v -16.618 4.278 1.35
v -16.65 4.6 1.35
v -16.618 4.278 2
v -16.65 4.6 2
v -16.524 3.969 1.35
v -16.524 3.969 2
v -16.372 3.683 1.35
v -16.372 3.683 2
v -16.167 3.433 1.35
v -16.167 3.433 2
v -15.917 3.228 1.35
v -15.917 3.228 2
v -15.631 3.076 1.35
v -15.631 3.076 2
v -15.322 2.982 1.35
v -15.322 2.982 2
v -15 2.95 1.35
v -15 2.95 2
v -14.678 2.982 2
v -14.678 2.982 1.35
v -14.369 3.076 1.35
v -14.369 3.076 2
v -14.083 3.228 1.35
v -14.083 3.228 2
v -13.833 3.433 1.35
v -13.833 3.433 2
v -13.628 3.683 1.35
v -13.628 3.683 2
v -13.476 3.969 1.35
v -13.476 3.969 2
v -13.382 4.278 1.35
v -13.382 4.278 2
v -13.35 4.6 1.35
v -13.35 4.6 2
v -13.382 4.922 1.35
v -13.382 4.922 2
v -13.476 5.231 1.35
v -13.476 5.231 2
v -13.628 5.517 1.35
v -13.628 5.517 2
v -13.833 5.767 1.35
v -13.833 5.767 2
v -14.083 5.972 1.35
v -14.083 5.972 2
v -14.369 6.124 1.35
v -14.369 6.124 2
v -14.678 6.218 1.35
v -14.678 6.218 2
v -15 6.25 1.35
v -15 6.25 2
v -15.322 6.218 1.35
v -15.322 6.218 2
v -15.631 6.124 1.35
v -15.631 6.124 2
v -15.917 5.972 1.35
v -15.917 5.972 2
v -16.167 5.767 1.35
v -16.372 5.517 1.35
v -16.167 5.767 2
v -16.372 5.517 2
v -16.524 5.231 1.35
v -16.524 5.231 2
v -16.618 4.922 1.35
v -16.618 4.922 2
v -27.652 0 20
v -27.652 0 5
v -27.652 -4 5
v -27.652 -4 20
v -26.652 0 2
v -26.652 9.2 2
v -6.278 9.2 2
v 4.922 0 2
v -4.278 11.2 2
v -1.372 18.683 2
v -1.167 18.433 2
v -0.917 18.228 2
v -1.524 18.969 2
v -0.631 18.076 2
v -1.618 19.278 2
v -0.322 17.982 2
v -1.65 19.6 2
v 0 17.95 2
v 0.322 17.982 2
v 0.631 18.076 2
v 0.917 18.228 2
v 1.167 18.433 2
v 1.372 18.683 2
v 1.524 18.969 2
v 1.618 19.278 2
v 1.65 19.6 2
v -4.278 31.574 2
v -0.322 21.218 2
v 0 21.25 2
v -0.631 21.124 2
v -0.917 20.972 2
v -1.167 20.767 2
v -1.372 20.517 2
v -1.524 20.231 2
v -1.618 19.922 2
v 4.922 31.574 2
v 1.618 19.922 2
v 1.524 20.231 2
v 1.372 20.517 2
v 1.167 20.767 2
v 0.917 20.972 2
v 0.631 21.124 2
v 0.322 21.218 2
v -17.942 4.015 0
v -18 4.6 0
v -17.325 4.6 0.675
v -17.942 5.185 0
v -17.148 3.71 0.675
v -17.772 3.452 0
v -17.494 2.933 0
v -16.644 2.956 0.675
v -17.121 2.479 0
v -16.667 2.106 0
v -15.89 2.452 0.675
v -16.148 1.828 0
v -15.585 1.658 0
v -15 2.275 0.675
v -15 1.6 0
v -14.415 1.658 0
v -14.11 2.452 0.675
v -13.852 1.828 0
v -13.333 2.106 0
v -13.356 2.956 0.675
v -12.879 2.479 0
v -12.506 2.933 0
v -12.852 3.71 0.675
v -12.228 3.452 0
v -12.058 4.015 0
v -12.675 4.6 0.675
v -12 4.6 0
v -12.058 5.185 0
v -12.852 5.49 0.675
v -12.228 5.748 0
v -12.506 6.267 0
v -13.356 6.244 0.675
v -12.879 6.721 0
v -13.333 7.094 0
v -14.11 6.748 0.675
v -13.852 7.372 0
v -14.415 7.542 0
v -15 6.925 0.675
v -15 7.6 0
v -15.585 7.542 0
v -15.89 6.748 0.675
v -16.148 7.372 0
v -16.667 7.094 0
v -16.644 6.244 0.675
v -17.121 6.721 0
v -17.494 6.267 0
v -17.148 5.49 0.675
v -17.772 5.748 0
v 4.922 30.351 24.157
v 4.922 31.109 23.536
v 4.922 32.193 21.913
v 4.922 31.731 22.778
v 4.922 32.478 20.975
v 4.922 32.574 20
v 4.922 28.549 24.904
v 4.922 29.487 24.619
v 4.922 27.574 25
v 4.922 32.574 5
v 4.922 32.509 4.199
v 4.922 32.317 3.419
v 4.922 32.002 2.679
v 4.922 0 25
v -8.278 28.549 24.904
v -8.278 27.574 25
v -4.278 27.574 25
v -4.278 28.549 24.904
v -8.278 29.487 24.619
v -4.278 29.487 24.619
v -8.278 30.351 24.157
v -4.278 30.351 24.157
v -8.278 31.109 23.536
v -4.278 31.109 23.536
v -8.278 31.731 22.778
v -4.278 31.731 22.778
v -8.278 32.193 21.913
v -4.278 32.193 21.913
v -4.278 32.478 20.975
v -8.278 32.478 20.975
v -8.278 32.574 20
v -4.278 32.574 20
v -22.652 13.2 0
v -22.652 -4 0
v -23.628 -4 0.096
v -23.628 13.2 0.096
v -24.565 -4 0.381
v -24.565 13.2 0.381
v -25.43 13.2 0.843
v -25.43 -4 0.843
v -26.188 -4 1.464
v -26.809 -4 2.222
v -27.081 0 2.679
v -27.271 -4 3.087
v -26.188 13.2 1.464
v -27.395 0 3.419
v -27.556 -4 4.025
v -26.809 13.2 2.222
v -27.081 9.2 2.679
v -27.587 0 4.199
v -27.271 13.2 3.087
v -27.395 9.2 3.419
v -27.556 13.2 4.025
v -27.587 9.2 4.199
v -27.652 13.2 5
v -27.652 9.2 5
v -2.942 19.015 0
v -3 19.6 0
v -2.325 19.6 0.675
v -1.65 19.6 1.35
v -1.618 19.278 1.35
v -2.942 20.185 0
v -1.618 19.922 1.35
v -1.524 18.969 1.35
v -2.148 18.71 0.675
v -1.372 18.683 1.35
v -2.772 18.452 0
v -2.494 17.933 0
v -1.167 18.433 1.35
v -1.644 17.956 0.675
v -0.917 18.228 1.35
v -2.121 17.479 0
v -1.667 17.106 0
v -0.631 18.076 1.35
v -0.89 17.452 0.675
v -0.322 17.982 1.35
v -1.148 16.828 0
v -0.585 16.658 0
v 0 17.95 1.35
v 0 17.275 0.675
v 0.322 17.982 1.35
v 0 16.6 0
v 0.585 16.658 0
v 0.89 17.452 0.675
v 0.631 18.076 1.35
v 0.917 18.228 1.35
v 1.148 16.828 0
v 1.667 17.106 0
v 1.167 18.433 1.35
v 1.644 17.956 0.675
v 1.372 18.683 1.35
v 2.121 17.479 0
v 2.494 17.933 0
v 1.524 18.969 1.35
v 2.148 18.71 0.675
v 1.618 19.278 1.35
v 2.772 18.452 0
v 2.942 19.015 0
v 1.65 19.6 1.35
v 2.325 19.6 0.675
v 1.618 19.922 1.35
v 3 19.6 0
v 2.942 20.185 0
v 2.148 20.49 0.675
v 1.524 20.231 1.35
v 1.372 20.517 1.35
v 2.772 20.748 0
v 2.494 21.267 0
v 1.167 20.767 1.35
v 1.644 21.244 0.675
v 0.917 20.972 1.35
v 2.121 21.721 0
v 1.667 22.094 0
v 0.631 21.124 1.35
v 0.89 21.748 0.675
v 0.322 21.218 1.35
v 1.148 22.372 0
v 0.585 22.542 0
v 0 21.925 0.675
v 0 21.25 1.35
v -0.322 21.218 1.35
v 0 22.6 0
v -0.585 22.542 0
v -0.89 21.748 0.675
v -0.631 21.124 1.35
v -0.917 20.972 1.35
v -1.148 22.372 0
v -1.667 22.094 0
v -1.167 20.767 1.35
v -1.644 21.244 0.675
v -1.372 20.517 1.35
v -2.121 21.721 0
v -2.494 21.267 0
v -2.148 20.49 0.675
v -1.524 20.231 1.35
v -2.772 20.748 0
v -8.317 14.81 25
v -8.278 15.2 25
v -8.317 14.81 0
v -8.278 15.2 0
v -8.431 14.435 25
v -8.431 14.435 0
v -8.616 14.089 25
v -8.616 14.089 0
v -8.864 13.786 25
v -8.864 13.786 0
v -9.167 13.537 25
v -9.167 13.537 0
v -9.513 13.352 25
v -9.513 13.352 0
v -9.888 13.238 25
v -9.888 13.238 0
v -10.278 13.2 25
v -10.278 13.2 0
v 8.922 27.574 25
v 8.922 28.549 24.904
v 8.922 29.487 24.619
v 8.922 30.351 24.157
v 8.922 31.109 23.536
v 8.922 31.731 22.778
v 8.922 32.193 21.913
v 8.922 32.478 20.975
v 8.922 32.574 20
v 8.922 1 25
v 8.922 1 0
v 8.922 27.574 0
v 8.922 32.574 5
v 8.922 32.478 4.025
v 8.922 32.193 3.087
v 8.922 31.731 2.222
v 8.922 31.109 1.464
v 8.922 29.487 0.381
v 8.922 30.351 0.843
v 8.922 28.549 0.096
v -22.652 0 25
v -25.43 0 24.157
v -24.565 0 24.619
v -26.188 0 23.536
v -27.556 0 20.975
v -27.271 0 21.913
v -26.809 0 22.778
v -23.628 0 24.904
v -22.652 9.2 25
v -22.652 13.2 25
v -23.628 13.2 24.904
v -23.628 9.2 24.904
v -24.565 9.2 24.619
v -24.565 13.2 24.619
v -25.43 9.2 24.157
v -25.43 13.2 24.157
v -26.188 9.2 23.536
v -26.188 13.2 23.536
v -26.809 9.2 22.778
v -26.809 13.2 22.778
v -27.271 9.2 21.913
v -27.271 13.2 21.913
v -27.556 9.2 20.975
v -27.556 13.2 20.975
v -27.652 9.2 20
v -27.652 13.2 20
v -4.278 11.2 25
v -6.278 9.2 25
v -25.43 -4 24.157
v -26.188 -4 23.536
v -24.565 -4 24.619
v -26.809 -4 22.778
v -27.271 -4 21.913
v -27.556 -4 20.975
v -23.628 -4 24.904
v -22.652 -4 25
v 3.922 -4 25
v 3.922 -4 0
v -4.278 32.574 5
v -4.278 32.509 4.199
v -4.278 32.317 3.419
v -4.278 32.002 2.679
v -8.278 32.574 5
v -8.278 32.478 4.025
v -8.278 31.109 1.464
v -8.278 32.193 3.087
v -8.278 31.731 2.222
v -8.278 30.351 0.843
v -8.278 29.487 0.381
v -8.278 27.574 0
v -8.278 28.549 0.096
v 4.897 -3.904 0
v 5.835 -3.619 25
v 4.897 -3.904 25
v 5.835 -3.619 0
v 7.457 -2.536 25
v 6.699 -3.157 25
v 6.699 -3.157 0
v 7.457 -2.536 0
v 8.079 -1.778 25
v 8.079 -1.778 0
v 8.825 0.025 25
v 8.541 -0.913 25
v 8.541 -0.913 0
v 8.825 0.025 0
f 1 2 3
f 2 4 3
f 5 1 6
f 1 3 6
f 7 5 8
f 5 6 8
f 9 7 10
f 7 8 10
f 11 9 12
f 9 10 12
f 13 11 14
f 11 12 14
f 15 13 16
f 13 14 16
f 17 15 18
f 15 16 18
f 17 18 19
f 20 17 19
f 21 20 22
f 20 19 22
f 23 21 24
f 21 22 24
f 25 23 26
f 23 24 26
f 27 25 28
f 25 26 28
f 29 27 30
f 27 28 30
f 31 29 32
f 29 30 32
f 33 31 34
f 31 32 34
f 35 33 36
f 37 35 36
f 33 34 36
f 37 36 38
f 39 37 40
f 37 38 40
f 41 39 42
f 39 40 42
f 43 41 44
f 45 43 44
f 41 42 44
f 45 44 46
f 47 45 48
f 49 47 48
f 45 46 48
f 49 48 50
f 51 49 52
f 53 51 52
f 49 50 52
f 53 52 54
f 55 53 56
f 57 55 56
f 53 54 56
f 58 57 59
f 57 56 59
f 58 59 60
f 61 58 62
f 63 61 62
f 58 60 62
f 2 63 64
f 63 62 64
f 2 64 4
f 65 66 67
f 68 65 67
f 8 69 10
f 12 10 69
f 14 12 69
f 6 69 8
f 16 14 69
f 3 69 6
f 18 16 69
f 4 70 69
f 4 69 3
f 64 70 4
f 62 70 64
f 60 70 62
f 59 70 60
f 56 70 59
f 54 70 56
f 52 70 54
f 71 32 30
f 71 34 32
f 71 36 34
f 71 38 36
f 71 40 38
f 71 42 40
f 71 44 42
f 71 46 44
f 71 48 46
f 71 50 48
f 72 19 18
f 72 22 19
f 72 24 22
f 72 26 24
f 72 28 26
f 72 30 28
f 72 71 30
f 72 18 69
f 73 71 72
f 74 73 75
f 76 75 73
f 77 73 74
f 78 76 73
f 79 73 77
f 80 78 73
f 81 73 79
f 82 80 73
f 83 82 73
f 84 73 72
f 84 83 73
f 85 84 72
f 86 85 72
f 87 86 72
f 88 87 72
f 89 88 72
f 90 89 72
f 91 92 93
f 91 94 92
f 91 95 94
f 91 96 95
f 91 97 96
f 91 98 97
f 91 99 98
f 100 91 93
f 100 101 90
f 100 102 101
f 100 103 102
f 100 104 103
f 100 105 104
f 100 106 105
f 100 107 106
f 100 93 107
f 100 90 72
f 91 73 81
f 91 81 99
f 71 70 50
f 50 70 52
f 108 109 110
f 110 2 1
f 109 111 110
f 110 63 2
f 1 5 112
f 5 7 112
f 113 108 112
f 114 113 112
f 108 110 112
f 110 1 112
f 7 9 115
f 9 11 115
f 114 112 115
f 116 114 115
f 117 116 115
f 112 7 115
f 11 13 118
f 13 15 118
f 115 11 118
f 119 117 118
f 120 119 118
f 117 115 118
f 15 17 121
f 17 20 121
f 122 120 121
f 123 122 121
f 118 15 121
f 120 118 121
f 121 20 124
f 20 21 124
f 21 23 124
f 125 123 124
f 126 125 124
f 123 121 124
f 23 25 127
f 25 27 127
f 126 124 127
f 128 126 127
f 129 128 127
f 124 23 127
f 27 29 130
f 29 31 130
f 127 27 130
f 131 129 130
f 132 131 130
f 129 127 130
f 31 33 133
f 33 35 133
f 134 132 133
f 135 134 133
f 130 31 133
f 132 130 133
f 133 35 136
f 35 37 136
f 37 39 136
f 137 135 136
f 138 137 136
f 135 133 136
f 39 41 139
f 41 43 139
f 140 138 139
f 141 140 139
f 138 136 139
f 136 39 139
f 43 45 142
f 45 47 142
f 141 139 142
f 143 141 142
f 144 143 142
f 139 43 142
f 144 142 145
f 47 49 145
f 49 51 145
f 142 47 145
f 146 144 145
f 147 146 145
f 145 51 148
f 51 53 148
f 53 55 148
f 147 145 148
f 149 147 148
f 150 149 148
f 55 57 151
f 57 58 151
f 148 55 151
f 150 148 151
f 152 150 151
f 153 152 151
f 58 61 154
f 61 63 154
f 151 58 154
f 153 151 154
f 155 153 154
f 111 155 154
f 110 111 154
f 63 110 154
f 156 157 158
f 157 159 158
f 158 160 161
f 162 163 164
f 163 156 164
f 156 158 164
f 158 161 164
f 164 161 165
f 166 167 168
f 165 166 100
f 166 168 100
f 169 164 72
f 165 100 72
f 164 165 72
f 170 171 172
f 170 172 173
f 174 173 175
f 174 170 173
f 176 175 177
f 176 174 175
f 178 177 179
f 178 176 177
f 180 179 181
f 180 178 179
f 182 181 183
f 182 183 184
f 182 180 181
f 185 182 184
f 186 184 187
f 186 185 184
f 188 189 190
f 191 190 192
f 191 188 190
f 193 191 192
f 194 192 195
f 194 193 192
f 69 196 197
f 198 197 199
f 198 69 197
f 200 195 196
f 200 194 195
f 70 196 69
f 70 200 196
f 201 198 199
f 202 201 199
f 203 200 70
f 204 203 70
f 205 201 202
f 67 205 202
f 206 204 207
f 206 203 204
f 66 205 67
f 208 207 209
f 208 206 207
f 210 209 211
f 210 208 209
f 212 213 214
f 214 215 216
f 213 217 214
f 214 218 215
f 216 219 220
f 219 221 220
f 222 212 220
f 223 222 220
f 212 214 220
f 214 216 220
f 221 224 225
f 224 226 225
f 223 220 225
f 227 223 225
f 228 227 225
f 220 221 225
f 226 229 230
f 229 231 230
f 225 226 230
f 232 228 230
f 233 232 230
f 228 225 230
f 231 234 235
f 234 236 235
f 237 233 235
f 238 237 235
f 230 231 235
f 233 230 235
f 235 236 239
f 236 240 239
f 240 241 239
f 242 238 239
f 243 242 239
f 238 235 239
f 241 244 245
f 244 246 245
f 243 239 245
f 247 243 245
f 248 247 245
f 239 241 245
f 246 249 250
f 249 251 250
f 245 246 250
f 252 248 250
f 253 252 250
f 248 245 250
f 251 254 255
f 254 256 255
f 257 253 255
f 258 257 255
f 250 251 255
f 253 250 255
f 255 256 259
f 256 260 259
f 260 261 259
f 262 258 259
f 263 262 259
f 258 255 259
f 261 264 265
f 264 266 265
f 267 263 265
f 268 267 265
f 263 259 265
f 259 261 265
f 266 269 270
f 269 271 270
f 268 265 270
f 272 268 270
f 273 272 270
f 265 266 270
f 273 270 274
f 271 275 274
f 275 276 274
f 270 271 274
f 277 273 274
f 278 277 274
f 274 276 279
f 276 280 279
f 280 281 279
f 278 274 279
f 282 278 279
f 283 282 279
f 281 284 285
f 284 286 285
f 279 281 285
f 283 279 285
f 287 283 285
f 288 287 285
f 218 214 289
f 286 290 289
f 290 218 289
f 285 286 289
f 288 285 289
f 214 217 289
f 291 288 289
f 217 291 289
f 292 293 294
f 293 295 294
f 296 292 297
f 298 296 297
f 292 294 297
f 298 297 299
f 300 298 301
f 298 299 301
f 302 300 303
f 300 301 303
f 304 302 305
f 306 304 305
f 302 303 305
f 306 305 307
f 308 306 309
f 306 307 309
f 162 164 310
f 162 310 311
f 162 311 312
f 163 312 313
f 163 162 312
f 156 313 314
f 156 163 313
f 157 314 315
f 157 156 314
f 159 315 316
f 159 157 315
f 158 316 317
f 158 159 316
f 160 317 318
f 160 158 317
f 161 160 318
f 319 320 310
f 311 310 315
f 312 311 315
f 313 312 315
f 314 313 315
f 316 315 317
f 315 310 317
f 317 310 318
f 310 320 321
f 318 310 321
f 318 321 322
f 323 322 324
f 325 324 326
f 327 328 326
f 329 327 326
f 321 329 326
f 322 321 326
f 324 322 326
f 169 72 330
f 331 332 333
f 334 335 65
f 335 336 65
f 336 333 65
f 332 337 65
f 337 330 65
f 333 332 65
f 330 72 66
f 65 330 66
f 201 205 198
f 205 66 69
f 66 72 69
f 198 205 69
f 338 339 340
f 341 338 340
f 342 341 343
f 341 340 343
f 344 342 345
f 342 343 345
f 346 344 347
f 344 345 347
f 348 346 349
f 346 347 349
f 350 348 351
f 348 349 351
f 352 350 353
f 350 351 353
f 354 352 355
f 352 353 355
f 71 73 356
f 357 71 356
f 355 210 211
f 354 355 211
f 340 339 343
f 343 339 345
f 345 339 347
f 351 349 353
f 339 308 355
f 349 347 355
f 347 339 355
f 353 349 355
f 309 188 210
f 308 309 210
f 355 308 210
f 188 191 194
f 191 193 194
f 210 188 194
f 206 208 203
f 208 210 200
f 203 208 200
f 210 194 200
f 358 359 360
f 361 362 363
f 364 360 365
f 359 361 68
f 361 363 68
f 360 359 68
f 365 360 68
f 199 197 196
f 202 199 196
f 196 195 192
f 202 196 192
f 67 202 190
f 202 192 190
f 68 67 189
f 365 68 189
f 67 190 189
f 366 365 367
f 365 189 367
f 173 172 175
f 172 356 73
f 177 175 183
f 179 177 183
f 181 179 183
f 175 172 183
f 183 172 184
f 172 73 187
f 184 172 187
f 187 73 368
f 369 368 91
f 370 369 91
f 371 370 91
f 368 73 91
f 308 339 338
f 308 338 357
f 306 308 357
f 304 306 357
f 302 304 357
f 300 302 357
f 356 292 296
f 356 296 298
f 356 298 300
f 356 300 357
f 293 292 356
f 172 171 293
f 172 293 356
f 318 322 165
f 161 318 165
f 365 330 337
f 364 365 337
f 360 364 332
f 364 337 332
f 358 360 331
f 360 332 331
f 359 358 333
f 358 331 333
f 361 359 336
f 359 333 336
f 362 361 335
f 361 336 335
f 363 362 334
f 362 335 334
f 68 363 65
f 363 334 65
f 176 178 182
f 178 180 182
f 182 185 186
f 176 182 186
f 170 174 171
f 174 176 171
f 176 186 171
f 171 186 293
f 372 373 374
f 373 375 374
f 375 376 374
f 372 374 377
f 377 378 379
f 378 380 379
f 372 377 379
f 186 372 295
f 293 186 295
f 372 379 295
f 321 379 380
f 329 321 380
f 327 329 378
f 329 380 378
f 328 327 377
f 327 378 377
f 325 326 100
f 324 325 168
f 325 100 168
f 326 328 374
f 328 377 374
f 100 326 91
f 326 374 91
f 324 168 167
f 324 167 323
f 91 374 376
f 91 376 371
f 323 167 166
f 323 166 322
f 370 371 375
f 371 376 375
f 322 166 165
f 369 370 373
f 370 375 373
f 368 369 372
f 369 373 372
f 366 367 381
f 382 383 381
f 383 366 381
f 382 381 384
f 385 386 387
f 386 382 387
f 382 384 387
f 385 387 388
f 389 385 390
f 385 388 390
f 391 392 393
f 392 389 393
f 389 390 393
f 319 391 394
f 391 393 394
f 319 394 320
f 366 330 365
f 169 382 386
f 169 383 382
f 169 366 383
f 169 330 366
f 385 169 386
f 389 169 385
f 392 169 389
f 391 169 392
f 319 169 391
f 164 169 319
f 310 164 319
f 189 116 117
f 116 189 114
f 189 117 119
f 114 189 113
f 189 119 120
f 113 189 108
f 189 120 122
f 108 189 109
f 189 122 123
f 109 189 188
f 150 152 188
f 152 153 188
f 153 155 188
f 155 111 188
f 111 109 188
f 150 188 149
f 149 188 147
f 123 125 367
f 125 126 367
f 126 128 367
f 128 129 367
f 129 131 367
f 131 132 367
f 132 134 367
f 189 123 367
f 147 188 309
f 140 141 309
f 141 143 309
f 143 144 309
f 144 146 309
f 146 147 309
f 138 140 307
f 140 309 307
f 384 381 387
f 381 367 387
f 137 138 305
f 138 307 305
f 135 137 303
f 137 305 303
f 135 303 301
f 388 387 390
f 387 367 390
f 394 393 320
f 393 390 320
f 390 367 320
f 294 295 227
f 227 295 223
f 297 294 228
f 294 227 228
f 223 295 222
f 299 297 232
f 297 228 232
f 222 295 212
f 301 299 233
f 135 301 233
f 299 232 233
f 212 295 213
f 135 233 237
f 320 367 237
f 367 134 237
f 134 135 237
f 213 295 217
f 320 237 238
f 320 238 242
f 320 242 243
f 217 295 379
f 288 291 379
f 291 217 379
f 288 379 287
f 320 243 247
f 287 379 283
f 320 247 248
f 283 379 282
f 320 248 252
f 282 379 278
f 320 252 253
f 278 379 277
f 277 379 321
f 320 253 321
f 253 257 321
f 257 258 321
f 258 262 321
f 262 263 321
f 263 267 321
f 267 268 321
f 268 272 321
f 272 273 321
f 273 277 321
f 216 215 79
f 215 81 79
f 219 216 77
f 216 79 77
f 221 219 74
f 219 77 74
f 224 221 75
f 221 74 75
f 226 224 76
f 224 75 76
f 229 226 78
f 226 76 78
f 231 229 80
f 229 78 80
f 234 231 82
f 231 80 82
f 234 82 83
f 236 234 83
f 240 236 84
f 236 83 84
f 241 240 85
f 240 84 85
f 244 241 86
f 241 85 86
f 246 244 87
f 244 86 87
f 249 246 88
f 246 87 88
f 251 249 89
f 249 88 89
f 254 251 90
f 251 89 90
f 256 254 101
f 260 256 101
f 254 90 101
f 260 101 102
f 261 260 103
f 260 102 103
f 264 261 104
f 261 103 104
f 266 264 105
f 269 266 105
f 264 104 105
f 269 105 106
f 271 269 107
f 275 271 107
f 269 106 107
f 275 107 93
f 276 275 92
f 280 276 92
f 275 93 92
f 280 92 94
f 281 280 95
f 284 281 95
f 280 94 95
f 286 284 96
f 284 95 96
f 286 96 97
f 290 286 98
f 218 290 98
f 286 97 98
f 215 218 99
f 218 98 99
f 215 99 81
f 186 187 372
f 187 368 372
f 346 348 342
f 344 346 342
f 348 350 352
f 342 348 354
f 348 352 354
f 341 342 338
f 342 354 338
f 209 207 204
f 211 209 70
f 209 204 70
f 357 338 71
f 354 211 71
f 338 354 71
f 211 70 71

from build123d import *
from build123d import SkipClean  # not in build123d's __all__

# Parameters (mm, degrees)
F1_DEPTH       = 2
F2_DEPTH       = 25
F3_T1_DEPTH    = 29
F3_T3_DEPTH    = 29
F3_T5_DEPTH    = 29
F3_T7_DEPTH    = 29
F3_T9_DEPTH    = 42.2
F3_T11_DEPTH   = 42.2
F3_T13_DEPTH   = 50
F4_R           = 2
F5_SIZE        = 2
F7_D           = 3.3
F7_CSINK_D     = 6
F7_CSINK_ANGLE = 90


# Not quite as in the source:
# - a fillet or chamfer that OpenCascade refuses, or shapes differently, is made with other operations: its cross-section is extruded or revolved along the edge and cut away or added
# - a feature names something its author has since deleted; it is built from what else it names


with BuildPart() as f1:
    # F0 (on Top) → F1 (new body)
    with BuildSketch(Plane.XY):
        Polygon((4.9215265818, 0), (4.9215265818, 9.2), (4.9215265818, 32.5735770881), (-4.2784734182, 32.5735770881), (-4.2784734182, 9.2), (-27.6520505063, 9.2), (-27.6520505063, 0), (0, 0), align=None)
        Polygon((4.9215265818, 32.5735770881), (4.9215265818, 9.2), (4.9215265818, 0), (0, 0), (-27.6520505063, 0), (-27.6520505063, -4), (0, -4), (8.9215265818, -4), (8.9215265818, 32.5735770881), align=None)
        Polygon((-4.2784734182, 9.2), (-4.2784734182, 32.5735770881), (-8.2784734182, 32.5735770881), (-8.2784734182, 13.2), (-27.6520505063, 13.2), (-27.6520505063, 9.2), align=None)
    extrude(amount=F1_DEPTH)

    # F0 (on Top) → F2 (join)
    with BuildSketch(Plane.XY):
        Polygon((-4.2784734182, 9.2), (-4.2784734182, 32.5735770881), (-8.2784734182, 32.5735770881), (-8.2784734182, 13.2), (-27.6520505063, 13.2), (-27.6520505063, 9.2), align=None)
        Polygon((4.9215265818, 32.5735770881), (4.9215265818, 9.2), (4.9215265818, 0), (0, 0), (-27.6520505063, 0), (-27.6520505063, -4), (0, -4), (8.9215265818, -4), (8.9215265818, 32.5735770881), align=None)
    extrude(amount=F2_DEPTH)

    # F3: fillet of radius 5 on 7 edges, made by hand

    # F3_s2 → F3_t1 (cut)
    with BuildSketch(Plane.XZ.offset(-12.5)):
        with BuildLine():
            ThreePointArc((-22.6520505063, 25), (-26.1875844123, 23.5355339059), (-27.6520505063, 20))
            Line((-27.6520505063, 20), (-27.6520505063, 25))
            Line((-27.6520505063, 25), (-22.6520505063, 25))
        make_face()
    extrude(amount=F3_T1_DEPTH, mode=Mode.SUBTRACT)

    # F3_s4 → F3_t3 (cut)
    with BuildSketch(Plane.XZ.offset(-25.7)):
        with BuildLine():
            ThreePointArc((-22.6520505063, 25), (-26.1875844123, 23.5355339059), (-27.6520505063, 20))
            Line((-27.6520505063, 20), (-27.6520505063, 25))
            Line((-27.6520505063, 25), (-22.6520505063, 25))
        make_face()
    extrude(amount=F3_T3_DEPTH, mode=Mode.SUBTRACT)

    # F3_s6 → F3_t5 (cut)
    with BuildSketch(Plane.YZ.offset(-20.7784734182)):
        with BuildLine():
            ThreePointArc((27.5735770881, 25), (31.1091109941, 23.5355339059), (32.5735770881, 20))
            Line((32.5735770881, 20), (32.5735770881, 25))
            Line((32.5735770881, 25), (27.5735770881, 25))
        make_face()
    extrude(amount=F3_T5_DEPTH, mode=Mode.SUBTRACT)

    # F3_s8 → F3_t7 (cut)
    with BuildSketch(Plane.YZ.offset(-7.5784734182)):
        with BuildLine():
            ThreePointArc((32.5735770881, 20), (31.1091109941, 23.5355339059), (27.5735770881, 25))
            Line((27.5735770881, 25), (32.5735770881, 25))
            Line((32.5735770881, 25), (32.5735770881, 20))
        make_face()
    with SkipClean():  # cleaning this boolean's faces spoils the solid; the shape is the same uncleaned
        extrude(amount=F3_T7_DEPTH, mode=Mode.SUBTRACT)

    # F3_s10 → F3_t9 (cut)
    with BuildSketch(Plane.XZ.offset(-25.7)):
        with BuildLine():
            ThreePointArc((-22.6520505063, 0), (-26.1875844123, 1.4644660941), (-27.6520505063, 5))
            Line((-27.6520505063, 5), (-27.6520505063, 0))
            Line((-27.6520505063, 0), (-22.6520505063, 0))
        make_face()
    extrude(amount=F3_T9_DEPTH, mode=Mode.SUBTRACT)

    # F3_s12 → F3_t11 (cut)
    with BuildSketch(Plane.YZ.offset(-20.7784734182)):
        with BuildLine():
            ThreePointArc((27.5735770881, 0), (31.1091109941, 1.4644660941), (32.5735770881, 5))
            Line((32.5735770881, 5), (32.5735770881, 0))
            Line((32.5735770881, 0), (27.5735770881, 0))
        make_face()
    extrude(amount=F3_T11_DEPTH, mode=Mode.SUBTRACT)

    # F3_s14 → F3_t13 (cut)
    with BuildSketch(Plane.XY.offset(-12.5)):
        with BuildLine():
            ThreePointArc((3.9215265818, -4), (7.4570604877, -2.5355339059), (8.9215265818, 1))
            Line((8.9215265818, 1), (8.9215265818, -4))
            Line((8.9215265818, -4), (3.9215265818, -4))
        make_face()
    extrude(amount=F3_T13_DEPTH, mode=Mode.SUBTRACT)

    # F4
    f4_edges = [f1.edges().sort_by_distance(p)[0] for p in [
        (-8.278473, 13.2, 12.5),
    ]]
    fillet(f4_edges, radius=F4_R)

    # F5
    f5_edges = [f1.edges().sort_by_distance(p)[0] for p in [
        (-4.278473, 9.2, 13.5),
    ]]
    chamfer(f5_edges, length=F5_SIZE)

    # F7 (through all)
    with Locations(Plane(origin=(0, 0, 0), x_dir=(1, 0, 0), z_dir=(0, 0, -1))):
        with Locations((-15, -4.6), (0, -19.6)):
            CounterSinkHole(F7_D / 2, F7_CSINK_D / 2, counter_sink_angle=F7_CSINK_ANGLE)


solid = f1.part
